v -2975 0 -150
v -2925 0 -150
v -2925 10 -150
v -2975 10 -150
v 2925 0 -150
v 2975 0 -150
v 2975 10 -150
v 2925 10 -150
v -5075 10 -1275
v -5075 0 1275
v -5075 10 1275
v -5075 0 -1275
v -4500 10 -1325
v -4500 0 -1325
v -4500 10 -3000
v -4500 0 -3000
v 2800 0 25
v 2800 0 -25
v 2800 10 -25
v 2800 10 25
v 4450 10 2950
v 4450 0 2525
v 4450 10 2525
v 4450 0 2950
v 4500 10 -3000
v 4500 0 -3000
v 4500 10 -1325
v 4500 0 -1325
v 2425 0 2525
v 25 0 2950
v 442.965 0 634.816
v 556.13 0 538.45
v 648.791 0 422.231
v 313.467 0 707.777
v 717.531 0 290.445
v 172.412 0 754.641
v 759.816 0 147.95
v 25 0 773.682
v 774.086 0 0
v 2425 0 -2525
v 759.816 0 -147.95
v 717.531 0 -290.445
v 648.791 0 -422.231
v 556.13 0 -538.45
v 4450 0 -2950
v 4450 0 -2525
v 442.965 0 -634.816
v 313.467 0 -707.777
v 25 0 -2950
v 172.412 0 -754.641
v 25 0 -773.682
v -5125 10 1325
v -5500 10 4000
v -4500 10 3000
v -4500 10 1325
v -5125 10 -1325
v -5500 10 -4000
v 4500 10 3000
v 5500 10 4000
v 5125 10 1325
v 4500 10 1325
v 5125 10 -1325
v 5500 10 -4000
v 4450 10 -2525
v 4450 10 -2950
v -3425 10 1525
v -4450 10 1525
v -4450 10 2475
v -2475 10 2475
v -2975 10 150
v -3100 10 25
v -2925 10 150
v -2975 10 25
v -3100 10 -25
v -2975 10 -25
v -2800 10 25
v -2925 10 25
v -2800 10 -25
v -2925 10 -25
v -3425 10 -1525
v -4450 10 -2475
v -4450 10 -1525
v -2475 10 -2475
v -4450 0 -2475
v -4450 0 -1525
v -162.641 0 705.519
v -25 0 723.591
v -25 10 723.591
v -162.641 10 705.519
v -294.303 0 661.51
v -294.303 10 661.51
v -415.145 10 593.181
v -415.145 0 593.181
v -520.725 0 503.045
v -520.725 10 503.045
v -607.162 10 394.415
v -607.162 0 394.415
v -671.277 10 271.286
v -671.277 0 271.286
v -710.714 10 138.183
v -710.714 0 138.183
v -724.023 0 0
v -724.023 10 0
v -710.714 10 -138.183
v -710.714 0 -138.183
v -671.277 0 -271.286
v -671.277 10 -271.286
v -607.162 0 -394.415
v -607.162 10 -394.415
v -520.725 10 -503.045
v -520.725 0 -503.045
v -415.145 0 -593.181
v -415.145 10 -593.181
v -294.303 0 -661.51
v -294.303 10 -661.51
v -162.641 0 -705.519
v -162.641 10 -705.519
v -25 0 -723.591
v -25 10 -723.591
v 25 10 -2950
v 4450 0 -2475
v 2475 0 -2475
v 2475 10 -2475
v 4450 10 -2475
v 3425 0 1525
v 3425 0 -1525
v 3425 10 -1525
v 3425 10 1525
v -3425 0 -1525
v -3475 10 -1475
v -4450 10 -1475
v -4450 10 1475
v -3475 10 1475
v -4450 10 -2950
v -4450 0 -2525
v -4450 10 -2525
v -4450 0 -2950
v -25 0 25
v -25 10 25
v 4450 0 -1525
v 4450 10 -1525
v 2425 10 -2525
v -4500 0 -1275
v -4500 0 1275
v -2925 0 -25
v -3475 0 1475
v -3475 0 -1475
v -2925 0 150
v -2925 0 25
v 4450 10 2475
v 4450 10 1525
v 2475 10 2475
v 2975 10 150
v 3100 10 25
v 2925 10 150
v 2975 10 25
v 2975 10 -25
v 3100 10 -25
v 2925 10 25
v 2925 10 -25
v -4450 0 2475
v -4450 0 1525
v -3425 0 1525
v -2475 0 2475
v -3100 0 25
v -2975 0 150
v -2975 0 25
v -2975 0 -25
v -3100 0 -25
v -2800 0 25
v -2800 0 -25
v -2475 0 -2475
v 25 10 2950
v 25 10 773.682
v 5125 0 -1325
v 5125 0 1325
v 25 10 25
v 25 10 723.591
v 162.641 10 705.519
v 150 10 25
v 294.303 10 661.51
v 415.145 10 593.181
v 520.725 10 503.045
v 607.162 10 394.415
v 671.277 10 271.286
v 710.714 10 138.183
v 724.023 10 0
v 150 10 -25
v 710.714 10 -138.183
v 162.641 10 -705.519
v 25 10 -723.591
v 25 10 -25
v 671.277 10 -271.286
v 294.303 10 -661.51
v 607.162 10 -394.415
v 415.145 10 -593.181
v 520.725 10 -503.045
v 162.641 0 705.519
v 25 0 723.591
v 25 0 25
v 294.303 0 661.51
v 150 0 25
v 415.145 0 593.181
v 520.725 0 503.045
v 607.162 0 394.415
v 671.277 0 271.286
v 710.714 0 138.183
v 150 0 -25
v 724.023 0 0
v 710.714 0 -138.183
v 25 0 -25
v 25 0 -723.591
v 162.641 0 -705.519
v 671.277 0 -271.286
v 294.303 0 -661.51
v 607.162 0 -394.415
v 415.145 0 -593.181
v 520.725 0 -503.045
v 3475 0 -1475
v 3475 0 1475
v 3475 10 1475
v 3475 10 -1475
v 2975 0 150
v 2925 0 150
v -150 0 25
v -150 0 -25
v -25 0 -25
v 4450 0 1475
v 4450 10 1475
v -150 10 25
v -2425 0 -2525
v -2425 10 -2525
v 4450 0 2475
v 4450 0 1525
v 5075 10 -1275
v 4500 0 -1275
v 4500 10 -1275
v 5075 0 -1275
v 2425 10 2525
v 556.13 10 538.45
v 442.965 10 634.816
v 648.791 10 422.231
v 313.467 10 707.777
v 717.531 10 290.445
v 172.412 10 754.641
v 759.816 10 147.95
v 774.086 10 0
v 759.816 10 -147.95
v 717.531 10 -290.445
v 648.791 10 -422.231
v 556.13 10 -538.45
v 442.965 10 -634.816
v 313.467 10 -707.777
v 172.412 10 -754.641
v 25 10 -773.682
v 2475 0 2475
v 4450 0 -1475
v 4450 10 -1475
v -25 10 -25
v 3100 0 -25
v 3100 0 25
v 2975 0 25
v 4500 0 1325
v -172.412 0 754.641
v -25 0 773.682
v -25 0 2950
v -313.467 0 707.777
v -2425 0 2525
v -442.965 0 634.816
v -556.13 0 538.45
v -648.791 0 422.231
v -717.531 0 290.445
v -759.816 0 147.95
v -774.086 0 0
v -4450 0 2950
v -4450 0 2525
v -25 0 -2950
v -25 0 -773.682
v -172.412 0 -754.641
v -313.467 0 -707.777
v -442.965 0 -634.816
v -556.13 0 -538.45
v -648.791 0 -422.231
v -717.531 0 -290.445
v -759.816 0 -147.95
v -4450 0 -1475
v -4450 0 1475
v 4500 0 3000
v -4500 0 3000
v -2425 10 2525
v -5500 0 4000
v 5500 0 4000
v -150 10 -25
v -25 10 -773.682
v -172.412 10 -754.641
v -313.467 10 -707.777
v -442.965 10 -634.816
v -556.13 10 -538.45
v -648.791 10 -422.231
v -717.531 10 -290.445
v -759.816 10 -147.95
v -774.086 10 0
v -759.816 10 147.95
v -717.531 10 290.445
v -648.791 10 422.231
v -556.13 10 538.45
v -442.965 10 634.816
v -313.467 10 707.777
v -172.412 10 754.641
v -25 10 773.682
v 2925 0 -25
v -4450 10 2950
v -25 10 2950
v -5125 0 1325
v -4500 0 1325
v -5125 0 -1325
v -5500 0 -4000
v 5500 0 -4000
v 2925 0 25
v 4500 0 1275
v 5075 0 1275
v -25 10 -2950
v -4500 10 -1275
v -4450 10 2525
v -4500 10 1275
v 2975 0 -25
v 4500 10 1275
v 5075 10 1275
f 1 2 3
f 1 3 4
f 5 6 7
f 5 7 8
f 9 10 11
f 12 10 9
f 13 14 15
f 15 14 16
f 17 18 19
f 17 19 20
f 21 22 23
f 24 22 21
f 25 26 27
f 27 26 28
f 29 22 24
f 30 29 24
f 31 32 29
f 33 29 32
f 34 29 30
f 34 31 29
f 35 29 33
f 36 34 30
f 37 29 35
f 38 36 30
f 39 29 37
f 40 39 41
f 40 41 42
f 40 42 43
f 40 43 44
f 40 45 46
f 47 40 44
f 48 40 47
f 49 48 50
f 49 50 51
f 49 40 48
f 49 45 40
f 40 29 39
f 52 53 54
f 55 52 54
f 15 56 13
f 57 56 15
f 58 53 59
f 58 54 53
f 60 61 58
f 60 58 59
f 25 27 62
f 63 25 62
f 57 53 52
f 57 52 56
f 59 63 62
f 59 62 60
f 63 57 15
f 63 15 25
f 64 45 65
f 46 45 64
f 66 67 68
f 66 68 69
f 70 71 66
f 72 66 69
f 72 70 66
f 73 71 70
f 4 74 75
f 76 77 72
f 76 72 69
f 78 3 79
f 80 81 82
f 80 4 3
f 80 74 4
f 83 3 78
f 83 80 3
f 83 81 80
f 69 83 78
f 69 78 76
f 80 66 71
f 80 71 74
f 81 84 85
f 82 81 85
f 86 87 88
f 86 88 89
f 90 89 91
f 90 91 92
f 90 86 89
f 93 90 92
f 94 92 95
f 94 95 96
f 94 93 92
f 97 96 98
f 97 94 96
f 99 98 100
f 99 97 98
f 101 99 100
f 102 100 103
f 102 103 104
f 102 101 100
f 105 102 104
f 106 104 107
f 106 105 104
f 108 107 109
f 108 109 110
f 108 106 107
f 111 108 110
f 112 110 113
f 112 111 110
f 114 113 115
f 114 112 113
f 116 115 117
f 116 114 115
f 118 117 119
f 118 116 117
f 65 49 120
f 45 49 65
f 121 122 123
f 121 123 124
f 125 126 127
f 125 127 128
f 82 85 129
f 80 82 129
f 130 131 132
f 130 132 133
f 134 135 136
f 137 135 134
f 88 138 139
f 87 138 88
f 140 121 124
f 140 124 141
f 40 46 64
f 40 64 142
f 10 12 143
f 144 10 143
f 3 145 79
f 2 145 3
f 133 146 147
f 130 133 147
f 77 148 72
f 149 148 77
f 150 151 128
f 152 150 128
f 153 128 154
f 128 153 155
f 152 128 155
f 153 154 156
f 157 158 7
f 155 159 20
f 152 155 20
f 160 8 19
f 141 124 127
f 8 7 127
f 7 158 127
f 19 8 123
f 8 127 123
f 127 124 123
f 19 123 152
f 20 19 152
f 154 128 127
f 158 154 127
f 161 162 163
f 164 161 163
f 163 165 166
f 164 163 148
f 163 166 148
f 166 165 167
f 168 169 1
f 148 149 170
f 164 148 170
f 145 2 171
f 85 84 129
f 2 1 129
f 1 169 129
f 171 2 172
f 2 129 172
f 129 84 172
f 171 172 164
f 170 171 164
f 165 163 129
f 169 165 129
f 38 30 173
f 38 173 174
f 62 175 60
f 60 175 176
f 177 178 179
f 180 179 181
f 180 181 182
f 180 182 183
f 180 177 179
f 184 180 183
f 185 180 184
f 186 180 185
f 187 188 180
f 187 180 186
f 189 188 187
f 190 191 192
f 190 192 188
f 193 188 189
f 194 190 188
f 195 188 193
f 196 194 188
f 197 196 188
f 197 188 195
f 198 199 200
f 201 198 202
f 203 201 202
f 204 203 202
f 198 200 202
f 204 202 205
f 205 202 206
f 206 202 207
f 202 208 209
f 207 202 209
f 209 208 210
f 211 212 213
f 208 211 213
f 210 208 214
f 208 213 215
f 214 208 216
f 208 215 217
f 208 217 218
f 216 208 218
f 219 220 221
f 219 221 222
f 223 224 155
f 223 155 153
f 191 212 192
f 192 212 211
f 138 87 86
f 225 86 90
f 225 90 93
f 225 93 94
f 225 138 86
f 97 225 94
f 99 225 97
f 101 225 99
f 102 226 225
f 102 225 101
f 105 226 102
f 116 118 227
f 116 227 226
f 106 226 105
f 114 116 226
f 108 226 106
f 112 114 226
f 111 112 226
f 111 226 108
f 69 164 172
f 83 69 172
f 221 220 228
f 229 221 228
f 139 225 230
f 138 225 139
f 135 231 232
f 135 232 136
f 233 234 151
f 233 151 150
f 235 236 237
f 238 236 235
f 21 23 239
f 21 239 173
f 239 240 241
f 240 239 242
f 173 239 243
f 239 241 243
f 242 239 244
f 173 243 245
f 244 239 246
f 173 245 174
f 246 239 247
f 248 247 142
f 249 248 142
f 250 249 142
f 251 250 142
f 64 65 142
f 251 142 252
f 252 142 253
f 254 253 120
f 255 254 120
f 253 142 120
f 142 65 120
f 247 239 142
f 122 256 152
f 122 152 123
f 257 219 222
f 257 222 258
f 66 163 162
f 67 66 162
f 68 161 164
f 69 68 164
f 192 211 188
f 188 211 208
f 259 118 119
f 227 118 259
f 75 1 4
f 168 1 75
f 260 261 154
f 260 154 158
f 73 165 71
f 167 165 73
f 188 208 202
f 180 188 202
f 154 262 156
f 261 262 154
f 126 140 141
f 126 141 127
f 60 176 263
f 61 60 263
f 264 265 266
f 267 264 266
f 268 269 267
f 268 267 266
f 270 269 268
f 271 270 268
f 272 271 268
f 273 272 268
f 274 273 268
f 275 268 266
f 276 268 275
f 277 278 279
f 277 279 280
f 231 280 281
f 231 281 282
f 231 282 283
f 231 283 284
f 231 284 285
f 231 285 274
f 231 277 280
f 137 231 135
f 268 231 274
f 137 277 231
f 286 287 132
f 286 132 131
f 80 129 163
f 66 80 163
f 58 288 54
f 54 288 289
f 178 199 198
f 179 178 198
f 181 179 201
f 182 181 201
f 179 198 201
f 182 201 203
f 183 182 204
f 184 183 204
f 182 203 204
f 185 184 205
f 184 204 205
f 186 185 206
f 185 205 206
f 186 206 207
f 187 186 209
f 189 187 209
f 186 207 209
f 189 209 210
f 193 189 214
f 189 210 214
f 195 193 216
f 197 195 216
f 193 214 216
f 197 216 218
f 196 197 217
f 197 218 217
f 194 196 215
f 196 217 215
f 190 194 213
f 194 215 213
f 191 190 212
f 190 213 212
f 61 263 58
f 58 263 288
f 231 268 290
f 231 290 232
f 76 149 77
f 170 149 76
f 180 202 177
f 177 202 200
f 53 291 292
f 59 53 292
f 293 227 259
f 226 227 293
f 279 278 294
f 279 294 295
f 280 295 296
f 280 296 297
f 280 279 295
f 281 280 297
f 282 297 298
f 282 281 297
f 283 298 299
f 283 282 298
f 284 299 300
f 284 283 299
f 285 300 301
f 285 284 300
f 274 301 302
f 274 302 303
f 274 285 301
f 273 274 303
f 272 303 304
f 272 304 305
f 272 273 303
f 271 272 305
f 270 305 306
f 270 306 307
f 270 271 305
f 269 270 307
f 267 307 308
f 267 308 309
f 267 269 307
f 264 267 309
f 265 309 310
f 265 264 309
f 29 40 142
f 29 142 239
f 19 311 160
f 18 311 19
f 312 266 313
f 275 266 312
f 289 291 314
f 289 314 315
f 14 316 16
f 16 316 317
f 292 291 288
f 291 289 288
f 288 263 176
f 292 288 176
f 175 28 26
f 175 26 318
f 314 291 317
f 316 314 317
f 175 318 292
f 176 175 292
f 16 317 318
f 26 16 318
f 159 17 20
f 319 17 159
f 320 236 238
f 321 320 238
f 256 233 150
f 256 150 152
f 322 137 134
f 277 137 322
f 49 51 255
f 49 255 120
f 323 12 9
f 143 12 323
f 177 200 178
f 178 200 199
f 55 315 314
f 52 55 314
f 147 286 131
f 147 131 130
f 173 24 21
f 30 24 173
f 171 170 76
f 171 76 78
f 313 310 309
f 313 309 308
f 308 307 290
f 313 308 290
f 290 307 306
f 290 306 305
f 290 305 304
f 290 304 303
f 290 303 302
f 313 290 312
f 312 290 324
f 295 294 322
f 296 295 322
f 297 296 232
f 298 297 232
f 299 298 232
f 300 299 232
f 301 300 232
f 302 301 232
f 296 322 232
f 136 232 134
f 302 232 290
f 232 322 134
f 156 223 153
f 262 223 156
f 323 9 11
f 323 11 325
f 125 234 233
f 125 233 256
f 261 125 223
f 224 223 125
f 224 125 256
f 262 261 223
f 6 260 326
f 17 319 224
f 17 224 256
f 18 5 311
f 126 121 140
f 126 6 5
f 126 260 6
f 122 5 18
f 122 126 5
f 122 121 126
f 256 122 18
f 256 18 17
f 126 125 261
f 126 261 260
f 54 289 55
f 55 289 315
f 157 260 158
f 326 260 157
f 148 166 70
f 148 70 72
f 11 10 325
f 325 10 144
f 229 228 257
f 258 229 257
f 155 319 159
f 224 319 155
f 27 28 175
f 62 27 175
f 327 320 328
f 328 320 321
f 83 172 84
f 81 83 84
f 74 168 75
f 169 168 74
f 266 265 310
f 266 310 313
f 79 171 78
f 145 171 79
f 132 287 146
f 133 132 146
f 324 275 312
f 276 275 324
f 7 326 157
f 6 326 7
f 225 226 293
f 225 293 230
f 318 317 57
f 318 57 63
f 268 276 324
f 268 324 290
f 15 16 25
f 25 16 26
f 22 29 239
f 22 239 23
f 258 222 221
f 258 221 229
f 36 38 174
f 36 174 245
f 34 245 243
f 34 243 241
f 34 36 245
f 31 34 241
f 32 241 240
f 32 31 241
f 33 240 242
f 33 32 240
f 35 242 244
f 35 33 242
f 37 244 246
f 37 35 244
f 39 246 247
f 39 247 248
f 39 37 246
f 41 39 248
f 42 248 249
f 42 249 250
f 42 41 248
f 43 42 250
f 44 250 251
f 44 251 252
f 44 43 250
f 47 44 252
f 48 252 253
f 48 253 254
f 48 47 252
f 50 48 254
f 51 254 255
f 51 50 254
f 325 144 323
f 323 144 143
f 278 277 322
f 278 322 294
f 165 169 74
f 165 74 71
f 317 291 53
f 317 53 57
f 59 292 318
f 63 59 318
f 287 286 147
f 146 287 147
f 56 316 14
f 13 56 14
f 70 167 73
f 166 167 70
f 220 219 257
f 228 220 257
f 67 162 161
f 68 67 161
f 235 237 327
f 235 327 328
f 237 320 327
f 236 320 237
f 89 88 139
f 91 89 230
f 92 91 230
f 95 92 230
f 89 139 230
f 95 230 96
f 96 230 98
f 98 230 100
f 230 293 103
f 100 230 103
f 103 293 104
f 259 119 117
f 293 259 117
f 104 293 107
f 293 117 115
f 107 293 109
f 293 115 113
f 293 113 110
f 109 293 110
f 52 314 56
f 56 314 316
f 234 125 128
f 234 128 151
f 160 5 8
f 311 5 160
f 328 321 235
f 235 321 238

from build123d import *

# Parameters (mm, degrees)
BOSS_EXTRUDE1_DEPTH    = 10
BOSS_EXTRUDE1_2_DEPTH  = 10
BOSS_EXTRUDE1_3_DEPTH  = 10
BOSS_EXTRUDE1_4_DEPTH  = 10
BOSS_EXTRUDE1_5_DEPTH  = 10
SKETCH1_W              = 975
SKETCH1_H              = 2950
BOSS_EXTRUDE1_6_DEPTH  = 10
SKETCH1_W_2            = 575
SKETCH1_H_2            = 2550
BOSS_EXTRUDE1_7_DEPTH  = 10
BOSS_EXTRUDE1_8_DEPTH  = 10
BOSS_EXTRUDE1_9_DEPTH  = 10
BOSS_EXTRUDE1_10_DEPTH = 10
SKETCH1_W_3            = 11000
SKETCH1_H_3            = 8000
BOSS_EXTRUDE1_11_DEPTH = 10


with BuildPart() as part:
    # Sketch1 → Boss-Extrude1 (new body)
    with BuildSketch(Plane(origin=(0, 0, 0), x_dir=(1, 0, 0), z_dir=(0, 1, 0))):
        with BuildLine():
            Line((25, -25), (25, -723.591162127))
            ThreePointArc((25, -723.591162127), (724.022907033, 0), (25, 723.591162127))
            Line((25, 723.591162127), (25, 25))
            Line((25, 25), (150, 25))
            Line((150, 25), (150, -25))
            Line((150, -25), (25, -25))
        make_face()
    extrude(amount=BOSS_EXTRUDE1_DEPTH)


with BuildPart() as body_2:
    # Sketch1 → Boss-Extrude1 2 (new body)
    with BuildSketch(Plane(origin=(0, 0, 0), x_dir=(1, 0, 0), z_dir=(0, 1, 0))):
        with BuildLine():
            Line((-25, 723.591162127), (-25, 25))
            Line((-25, 25), (-150, 25))
            Line((-150, 25), (-150, -25))
            Line((-150, -25), (-25, -25))
            Line((-25, -25), (-25, -723.591162127))
            ThreePointArc((-25, -723.591162127), (-724.022907033, 0), (-25, 723.591162127))
        make_face()
    extrude(amount=BOSS_EXTRUDE1_2_DEPTH)


with BuildPart() as body_3:
    # Sketch1 → Boss-Extrude1 3 (new body)
    with BuildSketch(Plane(origin=(0, 0, 0), x_dir=(1, 0, 0), z_dir=(0, 1, 0))):
        with BuildLine():
            ThreePointArc((-25, 773.682215065), (-774.086022292, 0), (-25, -773.682215065))
            Line((-25, -773.682215065), (-25, -2950))
            Line((-25, -2950), (-4450, -2950))
            Line((-4450, -2950), (-4450, -2525))
            Line((-4450, -2525), (-2425, -2525))
            Line((-2425, -2525), (-2425, 2525))
            Line((-2425, 2525), (-4450, 2525))
            Line((-4450, 2525), (-4450, 2950))
            Line((-4450, 2950), (-25, 2950))
            Line((-25, 2950), (-25, 773.682215065))
        make_face()
    extrude(amount=BOSS_EXTRUDE1_3_DEPTH)


with BuildPart() as body_4:
    # Sketch1 → Boss-Extrude1 4 (new body)
    with BuildSketch(Plane(origin=(0, 0, 0), x_dir=(1, 0, 0), z_dir=(0, 1, 0))):
        with BuildLine():
            ThreePointArc((25, -773.682215065), (774.086022292, 0), (25, 773.682215065))
            Line((25, 773.682215065), (25, 2950))
            Line((25, 2950), (4450, 2950))
            Line((4450, 2950), (4450, 2525))
            Line((4450, 2525), (2425, 2525))
            Line((2425, 2525), (2425, -2525))
            Line((2425, -2525), (4450, -2525))
            Line((4450, -2525), (4450, -2950))
            Line((4450, -2950), (25, -2950))
            Line((25, -2950), (25, -773.682215065))
        make_face()
    extrude(amount=BOSS_EXTRUDE1_4_DEPTH)


with BuildPart() as body_5:
    # Sketch1 → Boss-Extrude1 5 (new body)
    with BuildSketch(Plane(origin=(0, 0, 0), x_dir=(1, 0, 0), z_dir=(0, 1, 0))):
        Polygon((4450, -1525), (4450, -2475), (2475, -2475), (2475, 2475), (4450, 2475), (4450, 1525), (3425, 1525), (3425, -1525), align=None)
        Polygon((2975, 150), (2925, 150), (2925, 25), (2800, 25), (2800, -25), (2925, -25), (2925, -150), (2975, -150), (2975, -25), (3100, -25), (3100, 25), (2975, 25), align=None, mode=Mode.SUBTRACT)
    extrude(amount=BOSS_EXTRUDE1_5_DEPTH)


with BuildPart() as body_6:
    # Sketch1 → Boss-Extrude1 6 (new body)
    with BuildSketch(Plane(origin=(0, 0, 0), x_dir=(1, 0, 0), z_dir=(0, 1, 0))):
        with Locations((3962.5, 0)):
            Rectangle(SKETCH1_W, SKETCH1_H)
    extrude(amount=BOSS_EXTRUDE1_6_DEPTH)


with BuildPart() as body_7:
    # Sketch1 → Boss-Extrude1 7 (new body)
    with BuildSketch(Plane(origin=(0, 0, 0), x_dir=(1, 0, 0), z_dir=(0, 1, 0))):
        with Locations((4787.5, 0)):
            Rectangle(SKETCH1_W_2, SKETCH1_H_2)
    extrude(amount=BOSS_EXTRUDE1_7_DEPTH)


with BuildPart() as body_8:
    # Sketch1 → Boss-Extrude1 8 (new body)
    with BuildSketch(Plane(origin=(0, 0, 0), x_dir=(1, 0, 0), z_dir=(0, 1, 0))):
        Polygon((-3425, -1525), (-4450, -1525), (-4450, -2475), (-2475, -2475), (-2475, 2475), (-4450, 2475), (-4450, 1525), (-3425, 1525), align=None)
        Polygon((-2925, -25), (-2800, -25), (-2800, 25), (-2925, 25), (-2925, 150), (-2975, 150), (-2975, 25), (-3100, 25), (-3100, -25), (-2975, -25), (-2975, -150), (-2925, -150), align=None, mode=Mode.SUBTRACT)
    extrude(amount=BOSS_EXTRUDE1_8_DEPTH)


with BuildPart() as body_9:
    # Sketch1 → Boss-Extrude1 9 (new body)
    with BuildSketch(Plane(origin=(0, 0, 0), x_dir=(1, 0, 0), z_dir=(0, 1, 0))):
        with Locations((-3962.5, 0)):
            Rectangle(SKETCH1_W, SKETCH1_H)
    extrude(amount=BOSS_EXTRUDE1_9_DEPTH)


with BuildPart() as body_10:
    # Sketch1 → Boss-Extrude1 10 (new body)
    with BuildSketch(Plane(origin=(0, 0, 0), x_dir=(1, 0, 0), z_dir=(0, 1, 0))):
        with Locations((-4787.5, 0)):
            Rectangle(SKETCH1_W_2, SKETCH1_H_2)
    extrude(amount=BOSS_EXTRUDE1_10_DEPTH)


with BuildPart() as body_11:
    # Sketch1 → Boss-Extrude1 11 (new body)
    with BuildSketch(Plane(origin=(0, 0, 0), x_dir=(1, 0, 0), z_dir=(0, 1, 0))):
        Rectangle(SKETCH1_W_3, SKETCH1_H_3)
        Polygon((5125, -1325), (4500, -1325), (4500, -3000), (-4500, -3000), (-4500, -1325), (-5125, -1325), (-5125, 1325), (-4500, 1325), (-4500, 3000), (4500, 3000), (4500, 1325), (5125, 1325), align=None, mode=Mode.SUBTRACT)
    extrude(amount=BOSS_EXTRUDE1_11_DEPTH)


solid = Compound([part.part, body_2.part, body_3.part, body_4.part, body_5.part, body_6.part, body_7.part, body_8.part, body_9.part, body_10.part, body_11.part])
